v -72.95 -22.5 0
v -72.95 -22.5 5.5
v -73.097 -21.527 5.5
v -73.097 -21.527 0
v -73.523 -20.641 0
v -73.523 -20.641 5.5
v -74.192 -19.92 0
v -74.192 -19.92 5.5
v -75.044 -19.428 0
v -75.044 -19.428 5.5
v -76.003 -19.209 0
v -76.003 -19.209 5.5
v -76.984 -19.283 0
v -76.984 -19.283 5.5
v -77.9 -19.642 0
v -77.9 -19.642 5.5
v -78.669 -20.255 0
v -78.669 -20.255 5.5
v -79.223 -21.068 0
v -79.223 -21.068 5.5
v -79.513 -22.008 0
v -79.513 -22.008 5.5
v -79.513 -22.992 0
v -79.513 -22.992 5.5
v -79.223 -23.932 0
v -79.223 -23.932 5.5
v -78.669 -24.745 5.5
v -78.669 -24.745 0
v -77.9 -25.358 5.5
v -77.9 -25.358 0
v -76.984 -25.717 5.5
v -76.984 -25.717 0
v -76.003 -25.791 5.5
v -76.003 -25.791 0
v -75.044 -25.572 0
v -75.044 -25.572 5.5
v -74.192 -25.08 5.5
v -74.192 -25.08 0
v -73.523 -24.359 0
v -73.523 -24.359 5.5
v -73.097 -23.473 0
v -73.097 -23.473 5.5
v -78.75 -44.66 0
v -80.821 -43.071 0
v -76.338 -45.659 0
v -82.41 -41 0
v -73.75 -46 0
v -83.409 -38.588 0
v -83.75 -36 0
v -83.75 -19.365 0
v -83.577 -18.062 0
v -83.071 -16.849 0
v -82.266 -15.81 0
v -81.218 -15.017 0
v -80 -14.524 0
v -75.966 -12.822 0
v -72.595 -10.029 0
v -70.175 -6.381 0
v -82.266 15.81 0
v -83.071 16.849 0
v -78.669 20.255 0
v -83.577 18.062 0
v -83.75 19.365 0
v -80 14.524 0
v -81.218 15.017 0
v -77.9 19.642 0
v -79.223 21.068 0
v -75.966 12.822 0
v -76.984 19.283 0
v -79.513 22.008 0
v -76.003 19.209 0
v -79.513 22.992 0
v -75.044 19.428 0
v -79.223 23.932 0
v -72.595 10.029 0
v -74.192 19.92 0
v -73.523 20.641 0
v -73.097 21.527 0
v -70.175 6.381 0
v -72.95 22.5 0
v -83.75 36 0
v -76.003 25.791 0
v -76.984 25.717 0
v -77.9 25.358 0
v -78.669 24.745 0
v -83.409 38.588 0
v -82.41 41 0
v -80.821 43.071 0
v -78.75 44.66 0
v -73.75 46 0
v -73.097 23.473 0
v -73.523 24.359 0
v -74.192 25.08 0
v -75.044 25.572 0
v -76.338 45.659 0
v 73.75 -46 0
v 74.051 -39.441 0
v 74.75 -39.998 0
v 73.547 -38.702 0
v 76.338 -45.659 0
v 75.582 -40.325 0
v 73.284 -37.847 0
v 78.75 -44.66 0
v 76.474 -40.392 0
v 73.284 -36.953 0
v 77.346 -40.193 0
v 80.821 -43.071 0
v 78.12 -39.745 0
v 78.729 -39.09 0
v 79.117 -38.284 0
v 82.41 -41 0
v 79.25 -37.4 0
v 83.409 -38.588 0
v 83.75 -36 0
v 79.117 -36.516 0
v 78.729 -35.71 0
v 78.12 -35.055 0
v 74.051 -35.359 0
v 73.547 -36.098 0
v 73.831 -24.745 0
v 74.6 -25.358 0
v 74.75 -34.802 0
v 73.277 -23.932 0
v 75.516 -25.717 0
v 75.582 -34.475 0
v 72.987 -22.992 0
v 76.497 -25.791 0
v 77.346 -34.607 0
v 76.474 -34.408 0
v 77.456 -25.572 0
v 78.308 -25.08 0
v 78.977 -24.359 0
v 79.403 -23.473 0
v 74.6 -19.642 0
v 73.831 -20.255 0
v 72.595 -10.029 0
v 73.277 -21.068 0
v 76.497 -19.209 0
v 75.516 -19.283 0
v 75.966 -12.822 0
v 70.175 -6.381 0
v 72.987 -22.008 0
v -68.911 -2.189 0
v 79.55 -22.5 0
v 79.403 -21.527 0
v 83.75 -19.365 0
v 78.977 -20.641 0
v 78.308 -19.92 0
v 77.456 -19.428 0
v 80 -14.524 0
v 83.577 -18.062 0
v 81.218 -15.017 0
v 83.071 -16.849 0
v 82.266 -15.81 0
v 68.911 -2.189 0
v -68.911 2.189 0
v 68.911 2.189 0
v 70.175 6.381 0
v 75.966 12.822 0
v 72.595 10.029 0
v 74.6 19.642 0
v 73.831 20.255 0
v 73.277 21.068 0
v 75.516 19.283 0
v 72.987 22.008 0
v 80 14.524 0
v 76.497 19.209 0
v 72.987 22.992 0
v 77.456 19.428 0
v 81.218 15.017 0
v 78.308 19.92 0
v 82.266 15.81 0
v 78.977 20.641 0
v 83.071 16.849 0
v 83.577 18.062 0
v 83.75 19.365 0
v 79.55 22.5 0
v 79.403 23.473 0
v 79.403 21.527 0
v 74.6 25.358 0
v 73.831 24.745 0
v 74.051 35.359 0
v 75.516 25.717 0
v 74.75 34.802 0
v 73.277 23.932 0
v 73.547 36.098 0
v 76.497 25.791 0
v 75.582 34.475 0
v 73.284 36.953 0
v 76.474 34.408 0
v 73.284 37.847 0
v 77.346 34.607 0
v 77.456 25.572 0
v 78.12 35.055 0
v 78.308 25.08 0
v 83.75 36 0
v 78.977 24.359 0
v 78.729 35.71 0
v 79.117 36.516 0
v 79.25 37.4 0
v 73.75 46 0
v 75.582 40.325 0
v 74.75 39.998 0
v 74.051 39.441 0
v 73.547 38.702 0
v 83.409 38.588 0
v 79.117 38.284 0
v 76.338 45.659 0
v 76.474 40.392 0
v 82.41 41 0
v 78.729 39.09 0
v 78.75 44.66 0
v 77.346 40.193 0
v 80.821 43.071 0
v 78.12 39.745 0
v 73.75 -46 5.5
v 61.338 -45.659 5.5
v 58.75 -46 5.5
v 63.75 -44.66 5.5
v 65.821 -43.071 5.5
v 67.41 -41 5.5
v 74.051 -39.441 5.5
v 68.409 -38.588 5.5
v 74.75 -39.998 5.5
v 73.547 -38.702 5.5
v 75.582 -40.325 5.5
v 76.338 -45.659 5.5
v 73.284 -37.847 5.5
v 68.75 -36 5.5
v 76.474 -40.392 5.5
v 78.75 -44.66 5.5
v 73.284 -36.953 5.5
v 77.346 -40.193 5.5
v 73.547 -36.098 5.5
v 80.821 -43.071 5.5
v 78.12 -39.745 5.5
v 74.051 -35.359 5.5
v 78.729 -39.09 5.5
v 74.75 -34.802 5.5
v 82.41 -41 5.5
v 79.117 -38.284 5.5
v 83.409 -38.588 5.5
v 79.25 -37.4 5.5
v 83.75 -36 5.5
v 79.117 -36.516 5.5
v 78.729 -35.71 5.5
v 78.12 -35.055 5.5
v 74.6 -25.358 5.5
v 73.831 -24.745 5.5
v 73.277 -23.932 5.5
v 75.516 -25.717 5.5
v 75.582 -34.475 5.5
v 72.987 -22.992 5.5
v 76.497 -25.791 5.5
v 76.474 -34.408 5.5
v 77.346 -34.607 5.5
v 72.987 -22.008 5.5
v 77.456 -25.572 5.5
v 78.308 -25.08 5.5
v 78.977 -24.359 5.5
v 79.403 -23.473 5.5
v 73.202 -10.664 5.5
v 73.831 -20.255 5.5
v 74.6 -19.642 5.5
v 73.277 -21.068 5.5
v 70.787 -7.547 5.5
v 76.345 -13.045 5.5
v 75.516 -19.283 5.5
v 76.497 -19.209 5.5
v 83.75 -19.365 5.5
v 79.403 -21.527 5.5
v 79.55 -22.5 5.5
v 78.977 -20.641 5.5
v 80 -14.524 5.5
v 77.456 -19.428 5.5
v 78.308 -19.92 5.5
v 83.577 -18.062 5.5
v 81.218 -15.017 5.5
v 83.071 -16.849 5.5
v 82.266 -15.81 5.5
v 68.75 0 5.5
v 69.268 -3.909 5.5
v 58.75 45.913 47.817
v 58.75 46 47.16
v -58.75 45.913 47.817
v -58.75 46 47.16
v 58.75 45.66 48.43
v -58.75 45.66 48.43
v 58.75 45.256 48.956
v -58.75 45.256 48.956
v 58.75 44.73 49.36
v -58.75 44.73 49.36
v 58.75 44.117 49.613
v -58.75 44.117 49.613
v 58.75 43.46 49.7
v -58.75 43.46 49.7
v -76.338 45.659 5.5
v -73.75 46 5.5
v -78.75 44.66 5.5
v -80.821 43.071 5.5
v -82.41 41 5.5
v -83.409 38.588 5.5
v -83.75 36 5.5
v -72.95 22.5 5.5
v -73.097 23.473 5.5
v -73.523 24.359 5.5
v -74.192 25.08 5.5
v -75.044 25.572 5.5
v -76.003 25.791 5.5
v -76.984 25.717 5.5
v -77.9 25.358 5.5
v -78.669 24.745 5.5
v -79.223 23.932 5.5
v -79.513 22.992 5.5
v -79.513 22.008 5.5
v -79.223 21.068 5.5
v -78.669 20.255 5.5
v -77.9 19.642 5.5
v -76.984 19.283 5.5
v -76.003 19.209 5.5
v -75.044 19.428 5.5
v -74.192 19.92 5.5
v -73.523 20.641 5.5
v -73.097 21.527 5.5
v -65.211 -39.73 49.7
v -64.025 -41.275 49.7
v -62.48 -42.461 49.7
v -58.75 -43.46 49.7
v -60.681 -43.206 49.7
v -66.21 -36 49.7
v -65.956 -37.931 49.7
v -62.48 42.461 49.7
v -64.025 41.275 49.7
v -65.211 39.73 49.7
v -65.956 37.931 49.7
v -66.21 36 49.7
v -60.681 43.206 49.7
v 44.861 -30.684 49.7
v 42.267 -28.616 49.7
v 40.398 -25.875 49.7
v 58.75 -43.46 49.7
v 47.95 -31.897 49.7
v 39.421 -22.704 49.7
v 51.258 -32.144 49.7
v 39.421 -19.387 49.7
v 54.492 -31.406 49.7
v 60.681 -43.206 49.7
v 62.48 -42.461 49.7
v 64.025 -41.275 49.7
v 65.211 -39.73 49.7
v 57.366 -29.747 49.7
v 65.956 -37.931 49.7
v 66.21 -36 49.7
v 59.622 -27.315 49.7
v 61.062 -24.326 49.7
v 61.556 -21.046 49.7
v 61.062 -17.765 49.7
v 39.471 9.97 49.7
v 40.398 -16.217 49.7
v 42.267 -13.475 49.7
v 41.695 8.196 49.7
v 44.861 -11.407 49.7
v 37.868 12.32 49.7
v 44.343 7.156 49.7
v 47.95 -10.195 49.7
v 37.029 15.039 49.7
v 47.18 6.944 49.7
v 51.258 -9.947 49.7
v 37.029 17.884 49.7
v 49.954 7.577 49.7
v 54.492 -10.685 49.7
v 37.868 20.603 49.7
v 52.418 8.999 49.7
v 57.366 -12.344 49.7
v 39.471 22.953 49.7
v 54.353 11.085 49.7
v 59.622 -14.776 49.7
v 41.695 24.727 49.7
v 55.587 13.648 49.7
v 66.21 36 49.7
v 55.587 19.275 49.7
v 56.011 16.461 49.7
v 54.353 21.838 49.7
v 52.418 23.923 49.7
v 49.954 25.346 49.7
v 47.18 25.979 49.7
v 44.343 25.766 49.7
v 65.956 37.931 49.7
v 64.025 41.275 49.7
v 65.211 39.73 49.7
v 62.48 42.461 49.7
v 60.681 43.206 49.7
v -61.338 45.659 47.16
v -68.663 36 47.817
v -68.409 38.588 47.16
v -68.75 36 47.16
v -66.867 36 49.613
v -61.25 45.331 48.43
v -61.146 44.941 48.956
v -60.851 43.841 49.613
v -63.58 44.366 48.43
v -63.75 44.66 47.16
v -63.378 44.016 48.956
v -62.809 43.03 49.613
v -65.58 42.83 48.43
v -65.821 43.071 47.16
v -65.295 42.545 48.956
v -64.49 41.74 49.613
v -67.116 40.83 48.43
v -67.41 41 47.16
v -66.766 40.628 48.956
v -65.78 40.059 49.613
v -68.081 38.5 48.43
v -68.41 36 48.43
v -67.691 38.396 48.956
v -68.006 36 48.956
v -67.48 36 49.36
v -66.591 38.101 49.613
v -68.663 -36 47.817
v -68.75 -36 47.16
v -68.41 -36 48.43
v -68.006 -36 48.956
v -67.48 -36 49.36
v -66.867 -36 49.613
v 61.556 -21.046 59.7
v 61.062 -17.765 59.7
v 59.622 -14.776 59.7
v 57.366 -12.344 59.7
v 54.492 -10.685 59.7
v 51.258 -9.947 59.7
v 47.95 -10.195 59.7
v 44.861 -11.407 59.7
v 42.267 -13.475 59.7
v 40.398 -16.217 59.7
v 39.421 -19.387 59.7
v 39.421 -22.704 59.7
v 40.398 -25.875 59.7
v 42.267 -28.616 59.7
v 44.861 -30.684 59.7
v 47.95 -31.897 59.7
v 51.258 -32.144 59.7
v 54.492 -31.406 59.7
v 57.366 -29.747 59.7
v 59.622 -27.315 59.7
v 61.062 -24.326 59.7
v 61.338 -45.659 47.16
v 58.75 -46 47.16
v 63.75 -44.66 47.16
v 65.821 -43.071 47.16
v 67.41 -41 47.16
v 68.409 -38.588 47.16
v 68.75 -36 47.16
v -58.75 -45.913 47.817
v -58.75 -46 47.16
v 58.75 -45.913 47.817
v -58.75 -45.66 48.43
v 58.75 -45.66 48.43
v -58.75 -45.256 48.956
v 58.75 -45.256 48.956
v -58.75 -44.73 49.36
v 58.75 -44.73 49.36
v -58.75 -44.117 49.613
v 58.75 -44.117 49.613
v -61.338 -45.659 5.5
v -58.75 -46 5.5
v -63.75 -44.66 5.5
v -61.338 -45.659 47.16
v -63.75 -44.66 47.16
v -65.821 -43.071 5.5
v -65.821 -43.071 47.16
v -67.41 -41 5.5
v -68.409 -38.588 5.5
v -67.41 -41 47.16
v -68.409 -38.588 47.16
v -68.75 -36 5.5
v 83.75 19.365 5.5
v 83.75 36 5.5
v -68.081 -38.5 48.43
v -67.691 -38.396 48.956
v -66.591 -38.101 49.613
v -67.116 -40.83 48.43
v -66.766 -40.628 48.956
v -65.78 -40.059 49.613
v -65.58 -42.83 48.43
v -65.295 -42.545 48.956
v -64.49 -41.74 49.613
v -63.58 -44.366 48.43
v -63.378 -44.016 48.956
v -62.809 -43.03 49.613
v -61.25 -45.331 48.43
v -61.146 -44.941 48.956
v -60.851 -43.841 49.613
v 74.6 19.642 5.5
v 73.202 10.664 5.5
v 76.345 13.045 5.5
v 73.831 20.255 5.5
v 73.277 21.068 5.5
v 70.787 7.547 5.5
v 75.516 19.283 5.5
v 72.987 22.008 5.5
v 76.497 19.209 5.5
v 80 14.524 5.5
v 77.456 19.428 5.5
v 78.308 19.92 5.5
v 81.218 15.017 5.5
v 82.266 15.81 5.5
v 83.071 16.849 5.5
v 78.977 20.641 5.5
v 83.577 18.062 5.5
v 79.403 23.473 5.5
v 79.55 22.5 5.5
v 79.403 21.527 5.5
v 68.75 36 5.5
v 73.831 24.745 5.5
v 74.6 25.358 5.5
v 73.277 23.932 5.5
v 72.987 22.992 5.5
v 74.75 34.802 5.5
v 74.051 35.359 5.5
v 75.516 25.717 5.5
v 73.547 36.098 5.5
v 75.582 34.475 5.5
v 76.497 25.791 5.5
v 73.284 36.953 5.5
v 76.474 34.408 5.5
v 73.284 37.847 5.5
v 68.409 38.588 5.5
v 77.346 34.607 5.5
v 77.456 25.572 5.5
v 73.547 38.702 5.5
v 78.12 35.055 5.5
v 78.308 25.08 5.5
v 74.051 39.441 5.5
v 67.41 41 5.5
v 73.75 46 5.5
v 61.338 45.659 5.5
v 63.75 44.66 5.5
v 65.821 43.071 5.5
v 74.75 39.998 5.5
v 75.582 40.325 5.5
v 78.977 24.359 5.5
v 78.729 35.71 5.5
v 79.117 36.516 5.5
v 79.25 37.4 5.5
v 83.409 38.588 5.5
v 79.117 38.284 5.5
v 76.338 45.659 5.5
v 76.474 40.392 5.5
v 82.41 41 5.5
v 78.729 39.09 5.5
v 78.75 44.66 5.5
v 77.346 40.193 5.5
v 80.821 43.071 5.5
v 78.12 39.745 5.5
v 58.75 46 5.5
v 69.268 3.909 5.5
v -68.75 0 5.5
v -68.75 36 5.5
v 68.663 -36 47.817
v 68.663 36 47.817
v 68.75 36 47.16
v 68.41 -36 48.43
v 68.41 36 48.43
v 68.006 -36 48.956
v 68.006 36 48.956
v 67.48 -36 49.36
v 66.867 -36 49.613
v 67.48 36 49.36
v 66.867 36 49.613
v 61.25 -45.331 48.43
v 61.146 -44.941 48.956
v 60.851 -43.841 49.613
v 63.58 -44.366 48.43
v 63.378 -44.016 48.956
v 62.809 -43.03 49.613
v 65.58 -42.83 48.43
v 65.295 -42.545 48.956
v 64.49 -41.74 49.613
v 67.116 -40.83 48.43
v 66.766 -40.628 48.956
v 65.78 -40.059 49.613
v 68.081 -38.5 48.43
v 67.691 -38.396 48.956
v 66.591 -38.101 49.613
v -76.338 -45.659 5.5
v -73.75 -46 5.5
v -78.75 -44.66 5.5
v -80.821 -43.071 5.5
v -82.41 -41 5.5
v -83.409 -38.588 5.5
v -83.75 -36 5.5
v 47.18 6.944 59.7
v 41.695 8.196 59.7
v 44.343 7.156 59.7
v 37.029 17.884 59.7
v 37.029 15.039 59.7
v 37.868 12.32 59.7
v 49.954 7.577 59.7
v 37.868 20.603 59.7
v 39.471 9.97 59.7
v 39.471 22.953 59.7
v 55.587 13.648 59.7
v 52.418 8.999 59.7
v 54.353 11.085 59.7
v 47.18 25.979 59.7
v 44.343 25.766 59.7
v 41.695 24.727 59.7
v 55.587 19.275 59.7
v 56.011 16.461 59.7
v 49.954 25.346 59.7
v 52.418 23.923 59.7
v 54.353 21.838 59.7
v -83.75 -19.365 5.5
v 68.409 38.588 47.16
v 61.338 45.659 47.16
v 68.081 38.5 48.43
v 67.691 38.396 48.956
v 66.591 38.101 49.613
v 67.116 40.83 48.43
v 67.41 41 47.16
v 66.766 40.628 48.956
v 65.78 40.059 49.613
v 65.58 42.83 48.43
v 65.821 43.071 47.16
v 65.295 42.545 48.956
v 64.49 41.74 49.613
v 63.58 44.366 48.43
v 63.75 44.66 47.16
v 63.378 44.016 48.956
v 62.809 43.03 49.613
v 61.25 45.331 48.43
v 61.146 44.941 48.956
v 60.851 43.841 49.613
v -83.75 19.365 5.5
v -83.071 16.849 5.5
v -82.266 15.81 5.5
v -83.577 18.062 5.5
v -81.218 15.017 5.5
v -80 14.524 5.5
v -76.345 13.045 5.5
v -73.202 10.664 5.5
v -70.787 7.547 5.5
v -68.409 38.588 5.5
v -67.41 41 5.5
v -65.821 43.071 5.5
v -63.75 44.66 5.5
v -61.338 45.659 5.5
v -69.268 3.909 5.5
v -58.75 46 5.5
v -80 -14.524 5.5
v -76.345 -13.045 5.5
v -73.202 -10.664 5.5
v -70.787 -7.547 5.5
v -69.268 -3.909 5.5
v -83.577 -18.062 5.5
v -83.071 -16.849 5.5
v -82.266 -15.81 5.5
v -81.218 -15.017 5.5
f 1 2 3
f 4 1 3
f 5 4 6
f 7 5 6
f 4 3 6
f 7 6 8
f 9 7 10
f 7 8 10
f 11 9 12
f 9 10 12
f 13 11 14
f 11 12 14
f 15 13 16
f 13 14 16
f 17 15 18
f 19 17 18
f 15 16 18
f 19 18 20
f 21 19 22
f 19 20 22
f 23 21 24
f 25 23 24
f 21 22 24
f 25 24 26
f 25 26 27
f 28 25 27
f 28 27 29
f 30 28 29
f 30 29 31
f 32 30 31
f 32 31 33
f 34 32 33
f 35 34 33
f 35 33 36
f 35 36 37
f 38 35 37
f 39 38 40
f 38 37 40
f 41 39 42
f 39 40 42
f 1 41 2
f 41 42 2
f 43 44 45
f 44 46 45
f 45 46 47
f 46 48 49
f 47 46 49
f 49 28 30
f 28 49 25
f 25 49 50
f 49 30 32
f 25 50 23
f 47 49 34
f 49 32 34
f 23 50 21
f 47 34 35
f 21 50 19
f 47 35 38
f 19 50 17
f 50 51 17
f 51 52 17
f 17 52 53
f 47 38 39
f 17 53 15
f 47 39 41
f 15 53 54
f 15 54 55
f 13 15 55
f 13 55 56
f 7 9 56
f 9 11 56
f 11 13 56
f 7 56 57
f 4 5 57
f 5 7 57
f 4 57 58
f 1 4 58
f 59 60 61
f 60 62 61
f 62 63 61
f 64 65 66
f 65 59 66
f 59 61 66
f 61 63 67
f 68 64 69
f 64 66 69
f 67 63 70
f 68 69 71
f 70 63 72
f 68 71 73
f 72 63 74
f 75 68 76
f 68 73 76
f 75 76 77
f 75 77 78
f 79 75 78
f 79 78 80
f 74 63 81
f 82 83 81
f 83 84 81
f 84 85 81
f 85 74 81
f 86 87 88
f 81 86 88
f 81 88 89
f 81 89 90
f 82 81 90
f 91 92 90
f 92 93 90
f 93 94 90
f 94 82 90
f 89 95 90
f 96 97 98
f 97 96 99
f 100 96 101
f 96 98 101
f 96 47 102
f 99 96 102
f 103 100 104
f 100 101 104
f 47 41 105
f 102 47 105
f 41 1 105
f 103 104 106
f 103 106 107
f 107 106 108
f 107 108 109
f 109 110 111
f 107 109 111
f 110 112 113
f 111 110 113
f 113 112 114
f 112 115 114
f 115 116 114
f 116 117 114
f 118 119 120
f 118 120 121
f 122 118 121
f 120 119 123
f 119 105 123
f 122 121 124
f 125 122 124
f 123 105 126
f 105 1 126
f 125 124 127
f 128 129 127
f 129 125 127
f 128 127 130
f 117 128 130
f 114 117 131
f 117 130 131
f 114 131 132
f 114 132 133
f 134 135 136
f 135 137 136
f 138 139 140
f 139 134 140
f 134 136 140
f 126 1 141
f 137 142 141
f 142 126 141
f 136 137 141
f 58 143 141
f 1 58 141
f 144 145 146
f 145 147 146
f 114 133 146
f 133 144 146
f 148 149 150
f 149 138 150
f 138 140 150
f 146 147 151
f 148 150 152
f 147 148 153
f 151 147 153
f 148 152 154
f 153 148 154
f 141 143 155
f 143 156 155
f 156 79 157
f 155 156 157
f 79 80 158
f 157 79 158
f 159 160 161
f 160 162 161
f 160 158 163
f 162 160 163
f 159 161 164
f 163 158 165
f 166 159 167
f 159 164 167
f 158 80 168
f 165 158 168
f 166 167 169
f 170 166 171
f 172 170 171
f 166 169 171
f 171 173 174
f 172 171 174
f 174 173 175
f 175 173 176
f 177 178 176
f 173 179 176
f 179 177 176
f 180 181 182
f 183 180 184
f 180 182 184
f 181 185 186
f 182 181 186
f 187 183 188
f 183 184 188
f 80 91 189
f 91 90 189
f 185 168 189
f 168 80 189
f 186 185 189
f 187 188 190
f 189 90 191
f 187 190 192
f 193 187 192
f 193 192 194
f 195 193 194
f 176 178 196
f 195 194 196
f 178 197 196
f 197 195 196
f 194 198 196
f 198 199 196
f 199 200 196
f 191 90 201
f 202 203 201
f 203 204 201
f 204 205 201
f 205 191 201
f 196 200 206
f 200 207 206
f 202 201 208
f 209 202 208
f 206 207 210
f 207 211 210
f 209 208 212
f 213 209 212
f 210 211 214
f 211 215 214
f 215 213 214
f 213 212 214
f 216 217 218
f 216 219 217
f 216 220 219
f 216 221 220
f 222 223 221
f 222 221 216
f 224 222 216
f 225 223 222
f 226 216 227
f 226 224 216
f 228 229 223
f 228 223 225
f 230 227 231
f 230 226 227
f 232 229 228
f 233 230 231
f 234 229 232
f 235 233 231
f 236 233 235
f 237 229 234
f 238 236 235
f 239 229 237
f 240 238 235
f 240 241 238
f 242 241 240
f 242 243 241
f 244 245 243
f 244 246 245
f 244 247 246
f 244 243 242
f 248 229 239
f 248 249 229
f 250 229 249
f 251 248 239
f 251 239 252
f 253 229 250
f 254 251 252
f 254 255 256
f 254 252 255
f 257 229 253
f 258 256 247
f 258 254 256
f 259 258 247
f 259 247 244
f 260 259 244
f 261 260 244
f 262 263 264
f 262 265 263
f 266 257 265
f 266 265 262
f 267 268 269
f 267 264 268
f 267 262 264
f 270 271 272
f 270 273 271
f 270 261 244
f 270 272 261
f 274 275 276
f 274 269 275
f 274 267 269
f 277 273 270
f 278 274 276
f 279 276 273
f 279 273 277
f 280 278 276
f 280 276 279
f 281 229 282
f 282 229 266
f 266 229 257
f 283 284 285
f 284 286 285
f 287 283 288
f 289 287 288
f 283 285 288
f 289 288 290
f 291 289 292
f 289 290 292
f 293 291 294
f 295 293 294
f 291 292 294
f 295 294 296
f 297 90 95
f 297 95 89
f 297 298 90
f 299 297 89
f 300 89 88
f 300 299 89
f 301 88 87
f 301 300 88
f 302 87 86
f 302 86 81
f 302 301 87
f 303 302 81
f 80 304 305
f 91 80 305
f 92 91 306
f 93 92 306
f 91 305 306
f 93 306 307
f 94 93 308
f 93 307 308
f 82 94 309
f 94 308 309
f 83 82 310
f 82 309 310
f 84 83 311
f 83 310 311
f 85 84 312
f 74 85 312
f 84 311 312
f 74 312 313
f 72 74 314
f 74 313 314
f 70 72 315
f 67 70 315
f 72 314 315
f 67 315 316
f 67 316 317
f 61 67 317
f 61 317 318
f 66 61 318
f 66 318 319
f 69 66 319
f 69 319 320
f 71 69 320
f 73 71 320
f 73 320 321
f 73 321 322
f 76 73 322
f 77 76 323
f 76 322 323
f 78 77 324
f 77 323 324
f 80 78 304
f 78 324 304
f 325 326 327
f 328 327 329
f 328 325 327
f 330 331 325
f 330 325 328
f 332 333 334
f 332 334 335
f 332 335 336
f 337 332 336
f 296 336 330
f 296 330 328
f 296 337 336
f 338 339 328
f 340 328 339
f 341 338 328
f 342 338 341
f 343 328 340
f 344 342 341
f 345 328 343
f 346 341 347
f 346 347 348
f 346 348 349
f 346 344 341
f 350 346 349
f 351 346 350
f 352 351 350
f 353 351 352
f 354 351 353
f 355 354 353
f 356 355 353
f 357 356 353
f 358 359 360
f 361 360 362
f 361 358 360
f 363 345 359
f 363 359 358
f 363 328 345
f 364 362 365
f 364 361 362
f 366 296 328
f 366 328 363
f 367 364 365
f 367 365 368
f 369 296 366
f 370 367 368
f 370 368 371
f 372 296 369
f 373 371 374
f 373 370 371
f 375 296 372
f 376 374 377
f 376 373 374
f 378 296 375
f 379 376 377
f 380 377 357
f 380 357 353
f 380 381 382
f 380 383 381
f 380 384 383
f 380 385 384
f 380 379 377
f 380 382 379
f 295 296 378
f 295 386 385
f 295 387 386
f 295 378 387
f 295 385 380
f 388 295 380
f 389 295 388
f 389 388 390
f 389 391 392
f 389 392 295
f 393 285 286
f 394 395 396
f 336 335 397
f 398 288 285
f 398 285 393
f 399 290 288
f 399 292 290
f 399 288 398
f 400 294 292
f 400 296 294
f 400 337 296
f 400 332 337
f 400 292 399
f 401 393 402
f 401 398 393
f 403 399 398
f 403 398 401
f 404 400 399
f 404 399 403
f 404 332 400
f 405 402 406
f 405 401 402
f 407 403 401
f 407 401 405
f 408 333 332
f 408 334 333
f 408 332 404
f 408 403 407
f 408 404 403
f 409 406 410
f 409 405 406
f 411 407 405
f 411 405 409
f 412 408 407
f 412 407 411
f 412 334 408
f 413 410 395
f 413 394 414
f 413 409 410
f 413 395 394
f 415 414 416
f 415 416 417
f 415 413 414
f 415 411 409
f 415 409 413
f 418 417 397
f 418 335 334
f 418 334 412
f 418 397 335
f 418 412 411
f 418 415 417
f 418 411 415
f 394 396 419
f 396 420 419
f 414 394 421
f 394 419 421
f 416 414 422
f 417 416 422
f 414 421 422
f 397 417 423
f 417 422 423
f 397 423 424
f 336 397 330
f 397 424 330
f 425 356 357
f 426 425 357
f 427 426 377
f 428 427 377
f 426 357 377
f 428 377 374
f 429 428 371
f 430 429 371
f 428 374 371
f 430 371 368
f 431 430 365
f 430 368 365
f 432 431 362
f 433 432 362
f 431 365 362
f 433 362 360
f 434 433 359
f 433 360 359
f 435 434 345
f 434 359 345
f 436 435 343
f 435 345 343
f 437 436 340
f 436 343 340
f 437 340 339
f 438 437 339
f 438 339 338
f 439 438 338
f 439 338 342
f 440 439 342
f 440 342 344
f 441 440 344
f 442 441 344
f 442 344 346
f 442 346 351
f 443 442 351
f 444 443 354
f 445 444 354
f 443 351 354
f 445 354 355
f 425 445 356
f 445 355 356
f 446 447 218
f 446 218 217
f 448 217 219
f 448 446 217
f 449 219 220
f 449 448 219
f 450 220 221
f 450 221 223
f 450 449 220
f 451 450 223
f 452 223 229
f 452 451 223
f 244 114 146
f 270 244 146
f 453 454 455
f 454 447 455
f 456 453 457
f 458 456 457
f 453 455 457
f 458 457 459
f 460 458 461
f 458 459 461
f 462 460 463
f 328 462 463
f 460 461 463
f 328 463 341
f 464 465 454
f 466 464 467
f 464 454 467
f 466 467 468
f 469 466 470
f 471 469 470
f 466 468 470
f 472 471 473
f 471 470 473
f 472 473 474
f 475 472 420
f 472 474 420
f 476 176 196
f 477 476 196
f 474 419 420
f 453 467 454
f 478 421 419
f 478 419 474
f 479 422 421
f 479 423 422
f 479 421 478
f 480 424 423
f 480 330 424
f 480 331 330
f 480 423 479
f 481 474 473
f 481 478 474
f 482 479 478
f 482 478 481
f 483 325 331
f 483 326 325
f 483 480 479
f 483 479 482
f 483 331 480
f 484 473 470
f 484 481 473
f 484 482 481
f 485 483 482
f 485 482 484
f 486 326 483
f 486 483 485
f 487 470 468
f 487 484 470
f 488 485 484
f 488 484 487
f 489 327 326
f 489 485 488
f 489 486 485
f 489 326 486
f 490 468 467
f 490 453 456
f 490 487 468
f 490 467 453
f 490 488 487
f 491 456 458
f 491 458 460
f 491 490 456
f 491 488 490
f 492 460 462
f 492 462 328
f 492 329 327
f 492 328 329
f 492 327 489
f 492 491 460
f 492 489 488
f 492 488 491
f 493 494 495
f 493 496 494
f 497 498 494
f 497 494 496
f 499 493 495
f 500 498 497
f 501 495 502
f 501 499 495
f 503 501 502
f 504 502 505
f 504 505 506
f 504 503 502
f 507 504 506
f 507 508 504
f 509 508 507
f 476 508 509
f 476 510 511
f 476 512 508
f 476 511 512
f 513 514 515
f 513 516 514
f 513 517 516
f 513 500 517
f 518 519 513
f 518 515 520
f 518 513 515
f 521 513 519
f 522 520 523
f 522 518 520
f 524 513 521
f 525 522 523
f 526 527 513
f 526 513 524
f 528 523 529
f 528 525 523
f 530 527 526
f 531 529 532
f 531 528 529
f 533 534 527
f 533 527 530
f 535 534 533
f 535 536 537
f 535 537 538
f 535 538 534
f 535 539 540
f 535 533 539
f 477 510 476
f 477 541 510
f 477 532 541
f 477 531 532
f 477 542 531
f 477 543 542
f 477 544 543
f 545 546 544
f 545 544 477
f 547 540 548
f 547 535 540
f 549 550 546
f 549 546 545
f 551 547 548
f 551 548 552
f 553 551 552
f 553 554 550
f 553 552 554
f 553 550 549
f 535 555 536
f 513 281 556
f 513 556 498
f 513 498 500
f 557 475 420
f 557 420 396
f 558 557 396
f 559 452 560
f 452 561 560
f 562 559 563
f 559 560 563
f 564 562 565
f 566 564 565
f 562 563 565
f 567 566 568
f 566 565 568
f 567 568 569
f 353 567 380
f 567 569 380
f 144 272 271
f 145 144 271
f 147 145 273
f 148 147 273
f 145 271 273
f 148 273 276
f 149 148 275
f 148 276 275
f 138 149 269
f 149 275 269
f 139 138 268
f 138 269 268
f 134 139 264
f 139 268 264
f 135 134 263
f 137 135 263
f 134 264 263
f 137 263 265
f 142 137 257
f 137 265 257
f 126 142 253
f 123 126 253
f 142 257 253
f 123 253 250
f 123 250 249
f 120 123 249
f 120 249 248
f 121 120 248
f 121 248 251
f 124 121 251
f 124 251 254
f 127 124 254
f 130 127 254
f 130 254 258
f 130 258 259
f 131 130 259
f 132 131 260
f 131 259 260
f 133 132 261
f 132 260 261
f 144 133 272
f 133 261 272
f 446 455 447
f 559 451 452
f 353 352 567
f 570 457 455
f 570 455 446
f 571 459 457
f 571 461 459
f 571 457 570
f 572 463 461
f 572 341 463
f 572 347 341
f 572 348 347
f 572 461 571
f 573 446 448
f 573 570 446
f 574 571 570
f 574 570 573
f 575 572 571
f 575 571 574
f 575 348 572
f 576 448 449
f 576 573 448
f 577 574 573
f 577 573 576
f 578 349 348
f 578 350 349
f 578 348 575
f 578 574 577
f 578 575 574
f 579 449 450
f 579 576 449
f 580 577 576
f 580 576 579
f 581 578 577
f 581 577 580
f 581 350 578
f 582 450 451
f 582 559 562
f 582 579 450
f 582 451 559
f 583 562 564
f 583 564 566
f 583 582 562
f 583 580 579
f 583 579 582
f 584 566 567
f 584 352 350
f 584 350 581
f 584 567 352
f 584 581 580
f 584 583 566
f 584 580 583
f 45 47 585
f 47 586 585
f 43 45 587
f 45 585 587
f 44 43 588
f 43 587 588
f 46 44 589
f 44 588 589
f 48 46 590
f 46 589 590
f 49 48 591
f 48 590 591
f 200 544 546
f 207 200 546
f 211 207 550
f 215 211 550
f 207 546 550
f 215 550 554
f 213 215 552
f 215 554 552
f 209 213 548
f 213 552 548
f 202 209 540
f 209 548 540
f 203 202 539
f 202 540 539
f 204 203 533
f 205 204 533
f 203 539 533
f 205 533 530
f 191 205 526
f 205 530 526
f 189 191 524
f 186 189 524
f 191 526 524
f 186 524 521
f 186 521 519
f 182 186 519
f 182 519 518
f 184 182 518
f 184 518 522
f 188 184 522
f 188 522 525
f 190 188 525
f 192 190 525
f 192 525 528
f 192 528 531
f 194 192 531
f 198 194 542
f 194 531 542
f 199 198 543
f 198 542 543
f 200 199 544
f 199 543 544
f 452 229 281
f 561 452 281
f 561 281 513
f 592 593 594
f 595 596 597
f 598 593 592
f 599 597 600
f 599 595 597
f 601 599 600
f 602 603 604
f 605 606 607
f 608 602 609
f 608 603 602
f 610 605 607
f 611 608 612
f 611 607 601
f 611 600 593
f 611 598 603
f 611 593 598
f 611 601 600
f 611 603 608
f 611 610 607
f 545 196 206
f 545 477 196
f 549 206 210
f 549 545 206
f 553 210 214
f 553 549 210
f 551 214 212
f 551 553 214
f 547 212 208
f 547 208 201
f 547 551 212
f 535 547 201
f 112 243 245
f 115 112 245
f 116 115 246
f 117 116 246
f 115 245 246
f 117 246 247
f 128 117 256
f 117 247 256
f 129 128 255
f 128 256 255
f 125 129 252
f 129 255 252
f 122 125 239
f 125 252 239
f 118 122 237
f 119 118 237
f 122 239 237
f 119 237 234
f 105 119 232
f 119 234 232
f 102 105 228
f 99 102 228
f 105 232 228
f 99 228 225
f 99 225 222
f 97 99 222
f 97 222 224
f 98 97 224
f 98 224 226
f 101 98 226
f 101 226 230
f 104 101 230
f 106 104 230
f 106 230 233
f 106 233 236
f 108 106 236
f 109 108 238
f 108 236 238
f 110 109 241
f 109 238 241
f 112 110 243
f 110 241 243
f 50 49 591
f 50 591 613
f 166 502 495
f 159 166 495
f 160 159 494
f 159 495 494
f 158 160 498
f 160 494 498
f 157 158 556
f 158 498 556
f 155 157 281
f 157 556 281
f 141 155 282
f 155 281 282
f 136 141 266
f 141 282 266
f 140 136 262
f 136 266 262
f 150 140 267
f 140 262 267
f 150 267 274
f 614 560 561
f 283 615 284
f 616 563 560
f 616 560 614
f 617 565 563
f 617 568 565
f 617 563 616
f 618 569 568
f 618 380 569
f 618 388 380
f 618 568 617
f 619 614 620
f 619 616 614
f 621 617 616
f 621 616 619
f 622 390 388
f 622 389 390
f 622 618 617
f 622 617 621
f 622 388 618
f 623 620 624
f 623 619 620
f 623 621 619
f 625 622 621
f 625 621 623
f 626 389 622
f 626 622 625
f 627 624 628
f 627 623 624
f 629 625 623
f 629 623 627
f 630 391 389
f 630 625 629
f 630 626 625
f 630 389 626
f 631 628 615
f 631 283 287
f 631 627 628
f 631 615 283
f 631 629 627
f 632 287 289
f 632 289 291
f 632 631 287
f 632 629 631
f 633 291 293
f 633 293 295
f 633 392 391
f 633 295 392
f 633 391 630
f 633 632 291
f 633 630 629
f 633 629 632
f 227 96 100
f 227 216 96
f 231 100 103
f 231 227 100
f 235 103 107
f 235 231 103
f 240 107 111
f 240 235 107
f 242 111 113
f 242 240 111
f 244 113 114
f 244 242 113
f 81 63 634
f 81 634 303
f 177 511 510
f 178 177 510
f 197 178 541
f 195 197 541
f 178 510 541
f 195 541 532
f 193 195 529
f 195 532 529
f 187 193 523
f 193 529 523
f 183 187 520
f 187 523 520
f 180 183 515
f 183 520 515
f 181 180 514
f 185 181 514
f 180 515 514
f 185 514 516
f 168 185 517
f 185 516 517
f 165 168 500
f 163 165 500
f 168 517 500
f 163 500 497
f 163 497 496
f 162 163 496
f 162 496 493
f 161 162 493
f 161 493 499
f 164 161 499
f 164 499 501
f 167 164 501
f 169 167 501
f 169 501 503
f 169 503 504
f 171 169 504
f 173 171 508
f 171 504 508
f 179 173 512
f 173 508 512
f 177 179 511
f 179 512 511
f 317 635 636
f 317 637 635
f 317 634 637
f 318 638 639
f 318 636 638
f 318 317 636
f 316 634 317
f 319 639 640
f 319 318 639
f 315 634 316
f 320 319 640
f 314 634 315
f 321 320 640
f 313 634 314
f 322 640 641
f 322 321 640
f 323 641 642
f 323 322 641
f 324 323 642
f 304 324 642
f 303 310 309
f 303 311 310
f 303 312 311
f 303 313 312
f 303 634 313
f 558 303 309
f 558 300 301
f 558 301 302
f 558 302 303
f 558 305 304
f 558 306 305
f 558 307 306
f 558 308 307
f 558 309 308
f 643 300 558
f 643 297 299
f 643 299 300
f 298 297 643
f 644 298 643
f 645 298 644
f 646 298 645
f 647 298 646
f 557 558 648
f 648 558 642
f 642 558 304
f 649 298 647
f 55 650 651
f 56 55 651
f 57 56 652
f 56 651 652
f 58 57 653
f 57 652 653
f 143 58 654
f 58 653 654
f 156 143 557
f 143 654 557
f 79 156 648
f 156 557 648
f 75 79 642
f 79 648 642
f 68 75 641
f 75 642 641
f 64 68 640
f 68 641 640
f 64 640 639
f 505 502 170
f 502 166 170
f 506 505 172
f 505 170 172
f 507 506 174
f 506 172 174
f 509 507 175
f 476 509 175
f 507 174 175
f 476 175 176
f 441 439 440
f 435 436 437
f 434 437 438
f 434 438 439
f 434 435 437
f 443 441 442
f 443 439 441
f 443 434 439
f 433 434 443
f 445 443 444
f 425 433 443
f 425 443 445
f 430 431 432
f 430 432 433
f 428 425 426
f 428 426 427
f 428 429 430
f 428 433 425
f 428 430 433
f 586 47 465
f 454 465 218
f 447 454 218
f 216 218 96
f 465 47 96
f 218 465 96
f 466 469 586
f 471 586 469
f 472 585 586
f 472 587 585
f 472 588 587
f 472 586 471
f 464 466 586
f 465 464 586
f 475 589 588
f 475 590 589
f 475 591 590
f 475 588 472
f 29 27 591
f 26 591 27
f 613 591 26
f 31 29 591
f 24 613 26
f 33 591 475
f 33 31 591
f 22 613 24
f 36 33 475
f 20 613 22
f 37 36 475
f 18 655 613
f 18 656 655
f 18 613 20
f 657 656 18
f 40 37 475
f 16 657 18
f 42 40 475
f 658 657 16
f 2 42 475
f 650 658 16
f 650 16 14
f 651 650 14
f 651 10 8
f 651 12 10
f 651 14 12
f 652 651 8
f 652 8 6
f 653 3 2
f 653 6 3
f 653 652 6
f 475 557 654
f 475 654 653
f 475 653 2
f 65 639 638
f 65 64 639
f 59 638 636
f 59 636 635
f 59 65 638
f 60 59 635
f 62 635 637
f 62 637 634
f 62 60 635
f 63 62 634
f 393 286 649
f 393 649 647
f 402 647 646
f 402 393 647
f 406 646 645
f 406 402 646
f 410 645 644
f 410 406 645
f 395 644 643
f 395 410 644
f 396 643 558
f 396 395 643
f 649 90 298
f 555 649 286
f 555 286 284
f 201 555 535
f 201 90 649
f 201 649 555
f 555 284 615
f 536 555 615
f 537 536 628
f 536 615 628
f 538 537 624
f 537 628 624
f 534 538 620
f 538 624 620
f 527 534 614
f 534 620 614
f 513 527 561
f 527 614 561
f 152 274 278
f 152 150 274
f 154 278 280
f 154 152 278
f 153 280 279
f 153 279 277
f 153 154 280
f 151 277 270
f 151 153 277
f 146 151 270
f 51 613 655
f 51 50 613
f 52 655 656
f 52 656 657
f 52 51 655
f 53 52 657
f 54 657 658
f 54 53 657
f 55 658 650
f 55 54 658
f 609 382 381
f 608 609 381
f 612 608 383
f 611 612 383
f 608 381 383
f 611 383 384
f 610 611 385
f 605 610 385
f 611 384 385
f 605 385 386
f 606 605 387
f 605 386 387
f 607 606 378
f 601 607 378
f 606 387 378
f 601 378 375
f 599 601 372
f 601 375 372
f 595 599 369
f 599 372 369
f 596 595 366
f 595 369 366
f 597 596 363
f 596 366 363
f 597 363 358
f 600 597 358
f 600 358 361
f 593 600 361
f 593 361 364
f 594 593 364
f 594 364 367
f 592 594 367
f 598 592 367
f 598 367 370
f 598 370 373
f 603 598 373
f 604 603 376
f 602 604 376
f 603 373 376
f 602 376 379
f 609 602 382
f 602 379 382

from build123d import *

# Parameters (mm, degrees)
F0_W      = 167.5
F0_H      = 92
F1_DEPTH  = 5.5
F2_W      = 137.5
F2_H      = 92
F3_DEPTH  = 49.7
F4_R      = 10
F5_R      = 2.54
F6_R      = 3.3
F6_R_2    = 3
F7_DEPTH  = 5.5
F10_DEPTH = 5.5
F11_R     = 5
F12_R     = 11.129920483
F12_R_2   = 9.5443004054
F13_DEPTH = 10


# Not quite as in the source:
# - a feature names something its author has since deleted; it is built from what else it names


with BuildPart() as f1:
    # F0 (on Top) → F1 (new body)
    with BuildSketch(Plane.XY):
        Rectangle(F0_W, F0_H)
    extrude(amount=F1_DEPTH)

    # F2 (on Top) → F3 (join)
    with BuildSketch(Plane.XY):
        Rectangle(F2_W, F2_H)
    extrude(amount=F3_DEPTH)

    # F4
    f4_edges = [f1.edges().sort_by_distance(p)[0] for p in [
        (-83.75, -46, 2.75),
        (83.75, -46, 2.75),
        (83.75, 46, 2.75),
        (-83.75, 46, 2.75),
        (-68.75, 46, 27.6),
        (-68.75, -46, 27.6),
        (68.75, 46, 27.6),
        (68.75, -46, 27.6),
    ]]
    fillet(f4_edges, radius=F4_R)

    # F5
    f5_edges = [f1.edges().sort_by_distance(p)[0] for p in [
        (0, -46, 49.7),
        (0, 46, 49.7),
        (65.821068, -43.071068, 49.7),
        (68.75, 0, 49.7),
        (65.821068, 43.071068, 49.7),
        (-65.821068, -43.071068, 49.7),
        (-68.75, 0, 49.7),
        (-65.821068, 43.071068, 49.7),
    ]]
    fillet(f5_edges, radius=F5_R)

    # F6 (on face) → F7 (cut)
    with BuildSketch(Plane.XY.offset(5.5)):
        with Locations((-76.25, 22.5)):
            Circle(F6_R)
        with Locations((-76.25, -22.5)):
            Circle(F6_R)
        with Locations((76.25, -22.5)):
            Circle(F6_R)
        with Locations((76.25, 22.5)):
            Circle(F6_R)
        with Locations((76.25, 37.4)):
            Circle(F6_R_2)
        with Locations((76.25, -37.4)):
            Circle(F6_R_2)
    extrude(amount=-F7_DEPTH, mode=Mode.SUBTRACT)

    # F8 (on face) + F9 (on face) → F10 (cut)
    with BuildSketch(Plane.XY.offset(5.5)):
        with BuildLine():
            ThreePointArc((-83.75, -15), (-73.1433982822, -10.6066017178), (-68.75, 0))
            ThreePointArc((-68.75, 0), (-73.1433982822, 10.6066017178), (-83.75, 15))
            Line((-83.75, 15), (-83.75, -15))
        make_face()
    with BuildSketch(Plane.XY.offset(5.5)):
        with BuildLine():
            Line((83.75, -15), (83.75, 15))
            ThreePointArc((83.75, 15), (73.1433983426, 10.6066017782), (68.75, 1.709e-07))
            ThreePointArc((68.75, 1.709e-07), (73.1433982218, -10.6066016574), (83.75, -15))
        make_face()
    extrude(amount=-F10_DEPTH, mode=Mode.SUBTRACT)

    # F11
    f11_edges = [f1.edges().sort_by_distance(p)[0] for p in [
        (83.75, -15, 2.75),
        (-83.75, -15, 2.75),
        (-83.75, 15, 2.75),
        (83.75, 15, 2.75),
    ]]
    fillet(f11_edges, radius=F11_R)

    # F12 (on face) → F13 (join)
    with BuildSketch(Plane.XY.offset(49.7)):
        with Locations((50.4262000322, -21.045640111)):
            Circle(F12_R)
        with Locations((46.4671105146, 16.4614468813)):
            Circle(F12_R_2)
    extrude(amount=F13_DEPTH)


solid = f1.part
